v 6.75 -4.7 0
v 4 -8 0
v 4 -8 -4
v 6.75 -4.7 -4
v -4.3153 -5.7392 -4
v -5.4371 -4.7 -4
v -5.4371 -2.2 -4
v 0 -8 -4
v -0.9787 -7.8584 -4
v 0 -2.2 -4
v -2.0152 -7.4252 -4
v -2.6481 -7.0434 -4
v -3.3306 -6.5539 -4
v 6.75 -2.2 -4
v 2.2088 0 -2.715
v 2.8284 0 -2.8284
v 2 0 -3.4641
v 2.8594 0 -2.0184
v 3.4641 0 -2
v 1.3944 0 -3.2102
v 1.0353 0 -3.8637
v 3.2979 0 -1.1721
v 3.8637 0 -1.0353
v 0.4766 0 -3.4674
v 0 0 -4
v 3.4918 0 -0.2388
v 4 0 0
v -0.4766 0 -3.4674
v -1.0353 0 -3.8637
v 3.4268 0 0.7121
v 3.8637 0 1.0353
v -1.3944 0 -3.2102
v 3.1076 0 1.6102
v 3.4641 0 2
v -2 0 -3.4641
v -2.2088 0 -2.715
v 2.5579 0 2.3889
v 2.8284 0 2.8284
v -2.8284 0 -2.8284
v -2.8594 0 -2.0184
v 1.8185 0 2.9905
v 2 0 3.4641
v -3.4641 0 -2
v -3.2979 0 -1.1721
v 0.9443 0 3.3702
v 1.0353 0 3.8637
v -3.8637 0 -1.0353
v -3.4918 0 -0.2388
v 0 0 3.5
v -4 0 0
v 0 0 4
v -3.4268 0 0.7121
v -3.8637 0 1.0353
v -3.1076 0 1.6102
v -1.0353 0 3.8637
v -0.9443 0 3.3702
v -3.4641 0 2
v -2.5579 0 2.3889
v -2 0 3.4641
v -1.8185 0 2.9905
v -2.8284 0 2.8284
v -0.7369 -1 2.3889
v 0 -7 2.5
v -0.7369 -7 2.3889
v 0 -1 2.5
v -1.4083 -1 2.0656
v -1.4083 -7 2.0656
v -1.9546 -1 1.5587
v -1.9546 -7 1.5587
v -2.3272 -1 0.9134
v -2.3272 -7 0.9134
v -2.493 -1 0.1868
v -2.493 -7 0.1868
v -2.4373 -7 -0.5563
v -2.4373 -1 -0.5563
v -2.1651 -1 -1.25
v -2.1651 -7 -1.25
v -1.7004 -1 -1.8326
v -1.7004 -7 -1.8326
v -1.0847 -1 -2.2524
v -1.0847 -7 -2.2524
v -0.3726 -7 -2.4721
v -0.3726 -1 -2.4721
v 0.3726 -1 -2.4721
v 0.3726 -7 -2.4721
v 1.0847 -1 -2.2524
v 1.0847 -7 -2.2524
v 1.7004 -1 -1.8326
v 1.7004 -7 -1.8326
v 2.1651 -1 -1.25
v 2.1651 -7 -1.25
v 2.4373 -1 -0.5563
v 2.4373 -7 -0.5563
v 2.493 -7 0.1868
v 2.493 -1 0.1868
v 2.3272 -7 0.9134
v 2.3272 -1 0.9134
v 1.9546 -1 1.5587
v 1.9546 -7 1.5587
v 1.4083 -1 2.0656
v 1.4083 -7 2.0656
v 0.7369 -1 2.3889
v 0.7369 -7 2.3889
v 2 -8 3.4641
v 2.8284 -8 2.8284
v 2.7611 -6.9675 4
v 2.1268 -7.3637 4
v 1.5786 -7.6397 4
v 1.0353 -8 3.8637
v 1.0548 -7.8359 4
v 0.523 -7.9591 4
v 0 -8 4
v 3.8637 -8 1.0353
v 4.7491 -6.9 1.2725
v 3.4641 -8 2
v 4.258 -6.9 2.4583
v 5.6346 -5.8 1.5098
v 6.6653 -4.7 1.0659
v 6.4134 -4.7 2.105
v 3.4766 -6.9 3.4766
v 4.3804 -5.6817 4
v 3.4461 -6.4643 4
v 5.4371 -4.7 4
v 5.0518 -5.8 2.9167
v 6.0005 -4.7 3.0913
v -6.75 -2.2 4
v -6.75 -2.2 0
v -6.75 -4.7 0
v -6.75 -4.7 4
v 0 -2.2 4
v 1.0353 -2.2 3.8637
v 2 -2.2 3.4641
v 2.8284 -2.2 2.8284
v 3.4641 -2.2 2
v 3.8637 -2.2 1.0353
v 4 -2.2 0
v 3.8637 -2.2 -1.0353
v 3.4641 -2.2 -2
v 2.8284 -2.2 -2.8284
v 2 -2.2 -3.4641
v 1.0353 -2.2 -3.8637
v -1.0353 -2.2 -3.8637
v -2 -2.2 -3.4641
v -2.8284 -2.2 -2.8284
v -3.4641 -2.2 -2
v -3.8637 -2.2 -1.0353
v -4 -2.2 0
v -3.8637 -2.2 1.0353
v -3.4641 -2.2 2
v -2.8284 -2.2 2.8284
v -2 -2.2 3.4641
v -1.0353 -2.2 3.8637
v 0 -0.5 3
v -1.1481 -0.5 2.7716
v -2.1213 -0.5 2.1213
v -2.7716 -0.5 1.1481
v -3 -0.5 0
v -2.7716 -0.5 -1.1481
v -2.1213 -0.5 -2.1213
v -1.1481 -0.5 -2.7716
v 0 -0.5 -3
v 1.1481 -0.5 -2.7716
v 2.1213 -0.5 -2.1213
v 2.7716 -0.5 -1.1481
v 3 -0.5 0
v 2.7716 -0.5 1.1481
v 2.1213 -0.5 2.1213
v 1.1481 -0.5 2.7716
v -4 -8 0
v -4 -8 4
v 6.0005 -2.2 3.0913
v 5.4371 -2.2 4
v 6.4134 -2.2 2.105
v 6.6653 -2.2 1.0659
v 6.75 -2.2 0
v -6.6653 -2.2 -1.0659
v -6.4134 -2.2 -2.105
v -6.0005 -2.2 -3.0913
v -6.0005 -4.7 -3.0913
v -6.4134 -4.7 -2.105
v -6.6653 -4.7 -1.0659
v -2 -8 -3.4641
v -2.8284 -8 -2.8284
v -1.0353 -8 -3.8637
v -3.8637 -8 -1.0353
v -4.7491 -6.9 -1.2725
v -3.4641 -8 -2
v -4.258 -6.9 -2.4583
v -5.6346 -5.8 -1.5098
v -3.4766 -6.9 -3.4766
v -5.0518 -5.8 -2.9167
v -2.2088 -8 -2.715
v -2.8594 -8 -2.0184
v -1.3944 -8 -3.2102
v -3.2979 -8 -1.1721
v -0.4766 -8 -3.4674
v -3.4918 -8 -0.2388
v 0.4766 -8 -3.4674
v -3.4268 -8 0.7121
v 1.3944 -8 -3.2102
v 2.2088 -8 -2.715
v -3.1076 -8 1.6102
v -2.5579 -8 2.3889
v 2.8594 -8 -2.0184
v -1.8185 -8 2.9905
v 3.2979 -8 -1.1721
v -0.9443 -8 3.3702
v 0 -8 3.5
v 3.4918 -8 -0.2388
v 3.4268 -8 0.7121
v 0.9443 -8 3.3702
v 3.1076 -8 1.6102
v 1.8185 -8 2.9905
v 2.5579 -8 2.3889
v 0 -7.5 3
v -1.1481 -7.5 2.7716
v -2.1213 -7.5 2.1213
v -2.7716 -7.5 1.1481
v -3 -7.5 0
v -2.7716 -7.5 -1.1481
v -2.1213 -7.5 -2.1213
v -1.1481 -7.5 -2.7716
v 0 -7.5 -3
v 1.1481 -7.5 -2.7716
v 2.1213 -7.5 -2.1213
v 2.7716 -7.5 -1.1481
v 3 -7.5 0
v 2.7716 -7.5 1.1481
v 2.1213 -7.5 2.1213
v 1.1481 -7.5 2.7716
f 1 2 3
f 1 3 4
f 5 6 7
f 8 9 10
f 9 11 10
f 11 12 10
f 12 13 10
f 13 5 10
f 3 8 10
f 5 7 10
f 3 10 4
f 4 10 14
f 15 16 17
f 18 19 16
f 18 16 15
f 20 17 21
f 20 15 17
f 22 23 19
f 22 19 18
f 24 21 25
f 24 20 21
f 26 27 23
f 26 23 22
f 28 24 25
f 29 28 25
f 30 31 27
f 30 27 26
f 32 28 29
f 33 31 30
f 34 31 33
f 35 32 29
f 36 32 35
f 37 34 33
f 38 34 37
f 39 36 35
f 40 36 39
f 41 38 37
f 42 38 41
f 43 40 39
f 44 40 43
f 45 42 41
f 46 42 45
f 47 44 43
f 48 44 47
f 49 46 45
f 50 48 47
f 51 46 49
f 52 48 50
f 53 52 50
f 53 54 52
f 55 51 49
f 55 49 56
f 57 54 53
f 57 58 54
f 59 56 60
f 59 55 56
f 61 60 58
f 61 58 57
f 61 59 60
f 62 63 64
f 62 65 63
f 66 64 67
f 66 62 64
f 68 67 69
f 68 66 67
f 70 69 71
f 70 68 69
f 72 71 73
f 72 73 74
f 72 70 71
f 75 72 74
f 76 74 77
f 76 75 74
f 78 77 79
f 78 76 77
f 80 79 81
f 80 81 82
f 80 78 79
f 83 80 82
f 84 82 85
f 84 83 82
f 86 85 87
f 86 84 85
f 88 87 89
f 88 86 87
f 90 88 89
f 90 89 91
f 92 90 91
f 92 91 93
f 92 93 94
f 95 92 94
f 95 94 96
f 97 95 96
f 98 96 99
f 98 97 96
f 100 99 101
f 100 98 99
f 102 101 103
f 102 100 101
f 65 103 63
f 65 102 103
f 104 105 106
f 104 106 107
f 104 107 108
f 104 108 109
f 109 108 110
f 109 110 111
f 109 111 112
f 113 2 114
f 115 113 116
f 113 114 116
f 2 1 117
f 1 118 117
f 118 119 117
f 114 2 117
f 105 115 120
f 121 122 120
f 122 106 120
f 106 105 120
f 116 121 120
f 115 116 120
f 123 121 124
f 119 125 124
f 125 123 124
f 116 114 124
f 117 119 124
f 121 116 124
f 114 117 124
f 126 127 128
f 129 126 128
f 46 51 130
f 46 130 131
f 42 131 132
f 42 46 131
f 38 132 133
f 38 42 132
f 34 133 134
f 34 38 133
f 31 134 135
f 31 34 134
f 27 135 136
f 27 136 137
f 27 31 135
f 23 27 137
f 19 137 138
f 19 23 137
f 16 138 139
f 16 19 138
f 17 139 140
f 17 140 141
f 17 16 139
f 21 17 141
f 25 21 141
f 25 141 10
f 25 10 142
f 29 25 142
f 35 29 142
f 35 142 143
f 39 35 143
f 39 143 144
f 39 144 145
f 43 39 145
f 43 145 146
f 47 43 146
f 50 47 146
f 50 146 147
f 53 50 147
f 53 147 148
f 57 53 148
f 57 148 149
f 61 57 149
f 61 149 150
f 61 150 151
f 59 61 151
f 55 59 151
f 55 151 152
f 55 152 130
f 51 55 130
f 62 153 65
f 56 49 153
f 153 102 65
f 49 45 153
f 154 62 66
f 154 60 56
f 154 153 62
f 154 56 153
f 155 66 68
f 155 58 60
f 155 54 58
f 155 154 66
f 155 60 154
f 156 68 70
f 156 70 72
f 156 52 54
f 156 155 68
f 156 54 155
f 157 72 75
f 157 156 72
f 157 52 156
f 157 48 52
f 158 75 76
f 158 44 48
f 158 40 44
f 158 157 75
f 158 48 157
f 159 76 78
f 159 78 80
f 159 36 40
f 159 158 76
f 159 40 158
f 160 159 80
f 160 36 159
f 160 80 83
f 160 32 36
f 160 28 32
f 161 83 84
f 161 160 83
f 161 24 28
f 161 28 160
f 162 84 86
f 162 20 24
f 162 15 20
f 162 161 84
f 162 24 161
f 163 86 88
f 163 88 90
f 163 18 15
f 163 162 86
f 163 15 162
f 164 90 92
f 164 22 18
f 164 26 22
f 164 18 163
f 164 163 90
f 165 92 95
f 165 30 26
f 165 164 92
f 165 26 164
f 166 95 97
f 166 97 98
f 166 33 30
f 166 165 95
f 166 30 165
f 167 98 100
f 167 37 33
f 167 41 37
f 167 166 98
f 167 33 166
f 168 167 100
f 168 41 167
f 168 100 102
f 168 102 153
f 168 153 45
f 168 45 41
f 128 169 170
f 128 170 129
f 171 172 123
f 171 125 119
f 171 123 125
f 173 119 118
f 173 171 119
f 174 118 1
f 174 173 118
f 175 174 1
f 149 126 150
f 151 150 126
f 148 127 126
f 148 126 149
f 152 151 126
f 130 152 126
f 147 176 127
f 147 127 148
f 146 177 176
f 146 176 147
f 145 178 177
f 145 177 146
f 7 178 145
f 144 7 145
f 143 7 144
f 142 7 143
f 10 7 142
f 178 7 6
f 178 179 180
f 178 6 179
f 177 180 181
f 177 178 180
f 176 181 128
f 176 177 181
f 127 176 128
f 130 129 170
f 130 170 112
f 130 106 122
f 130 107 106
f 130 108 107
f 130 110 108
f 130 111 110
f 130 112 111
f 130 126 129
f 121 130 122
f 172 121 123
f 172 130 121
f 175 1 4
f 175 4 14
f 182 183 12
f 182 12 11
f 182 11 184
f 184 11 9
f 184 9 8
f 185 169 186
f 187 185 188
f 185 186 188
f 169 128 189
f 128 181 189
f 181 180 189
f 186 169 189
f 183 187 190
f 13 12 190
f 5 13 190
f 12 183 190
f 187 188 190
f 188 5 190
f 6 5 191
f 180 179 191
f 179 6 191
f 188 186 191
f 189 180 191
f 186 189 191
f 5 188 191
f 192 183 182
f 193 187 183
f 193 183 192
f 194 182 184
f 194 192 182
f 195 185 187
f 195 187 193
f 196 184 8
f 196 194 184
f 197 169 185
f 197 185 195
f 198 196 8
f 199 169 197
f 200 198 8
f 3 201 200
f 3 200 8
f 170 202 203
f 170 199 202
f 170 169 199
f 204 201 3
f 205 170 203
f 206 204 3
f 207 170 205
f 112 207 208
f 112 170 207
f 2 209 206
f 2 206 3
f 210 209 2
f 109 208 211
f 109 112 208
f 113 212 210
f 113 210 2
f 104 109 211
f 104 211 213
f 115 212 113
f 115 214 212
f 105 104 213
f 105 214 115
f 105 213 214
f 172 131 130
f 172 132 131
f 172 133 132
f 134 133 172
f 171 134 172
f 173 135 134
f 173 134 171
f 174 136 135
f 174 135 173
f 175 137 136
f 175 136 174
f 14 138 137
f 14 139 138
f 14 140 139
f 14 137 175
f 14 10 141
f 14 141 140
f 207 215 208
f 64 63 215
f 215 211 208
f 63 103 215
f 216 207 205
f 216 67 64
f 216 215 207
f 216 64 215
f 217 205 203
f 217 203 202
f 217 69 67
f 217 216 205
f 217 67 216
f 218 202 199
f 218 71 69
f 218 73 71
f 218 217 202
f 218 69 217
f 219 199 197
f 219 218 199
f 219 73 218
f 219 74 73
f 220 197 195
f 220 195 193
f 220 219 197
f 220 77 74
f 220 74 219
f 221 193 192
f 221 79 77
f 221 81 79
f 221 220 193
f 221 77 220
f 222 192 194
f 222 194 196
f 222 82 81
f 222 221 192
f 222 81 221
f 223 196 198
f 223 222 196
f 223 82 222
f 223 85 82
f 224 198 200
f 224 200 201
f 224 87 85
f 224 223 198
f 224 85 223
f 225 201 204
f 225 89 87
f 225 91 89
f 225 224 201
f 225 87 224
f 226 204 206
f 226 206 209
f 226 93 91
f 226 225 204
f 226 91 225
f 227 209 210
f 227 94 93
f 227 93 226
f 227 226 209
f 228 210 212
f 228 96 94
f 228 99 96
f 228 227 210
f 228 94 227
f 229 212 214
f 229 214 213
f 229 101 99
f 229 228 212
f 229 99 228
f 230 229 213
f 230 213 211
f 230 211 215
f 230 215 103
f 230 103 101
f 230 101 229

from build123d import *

# Parameters (mm, degrees)
EXTRUDE_1_DEPTH     = 4
SKETCH_4_OUTSIDE_W  = 19.022
SKETCH_4_OUTSIDE_H  = 13.522
SKETCH_4_OUTSIDE_R  = 4
CUT_EXTRUDE_1_DEPTH = 2.2
CUT_EXTRUDE_2_DEPTH = 6.8


with BuildPart() as part:
    # Эскиз1 → Бобышка-Вытянуть1 (new body, symmetric)
    with BuildSketch(Plane.XY):
        Polygon((4, 0), (-4, 0), (-4, -2.2), (-6.75, -2.2), (-6.75, -8), (6.75, -8), (6.75, -2.2), (4, -2.2), align=None)
    extrude(amount=EXTRUDE_1_DEPTH, both=True)

    # Эскиз3 → Отверстие обработанное метчиком M62 (revolve, cut)
    with BuildSketch(Plane(origin=(0, 0, 0), x_dir=(0, 0, 1), z_dir=(1, 0, 0))):
        Polygon((0, 0), (0, 8), (3.5, 8), (2.5, 7), (2.5, 1), (3.5, 0), align=None)
    revolve(axis=Axis((0, 6.35, 0), (0, -1, 0)), mode=Mode.SUBTRACT)

    # Эскиз4 outside → Вырез-Вытянуть1 (cut)
    with BuildSketch(Plane(origin=(0, 0, 0), x_dir=(1, 0, 0), z_dir=(0, 1, 0))):
        Rectangle(SKETCH_4_OUTSIDE_W, SKETCH_4_OUTSIDE_H)
        with Locations(Location((0, 0, 0), (0, 0, 270))):  # turned: the seam where the file's is
            Circle(SKETCH_4_OUTSIDE_R, mode=Mode.SUBTRACT)
    extrude(amount=-CUT_EXTRUDE_1_DEPTH, mode=Mode.SUBTRACT)

    # Эскиз5 → Вырез-Вытянуть2 (cut, through all)
    with BuildSketch(Plane(origin=(0, -2.2, 0), x_dir=(1, 0, 0), z_dir=(0, 1, 0))):
        with BuildLine():
            Line((-6.75, 0), (-6.75, 4))
            Line((-6.75, 4), (-5.437140793, 4))
            ThreePointArc((-5.437140793, 4), (-6.413392252, 2.104970267), (-6.75, 0))
        make_face()
        with BuildLine():
            Line((6.75, 0), (6.75, -4))
            Line((6.75, -4), (5.437140793, -4))
            ThreePointArc((5.437140793, -4), (6.413392252, -2.104970267), (6.75, 0))
        make_face()
    extrude(amount=-CUT_EXTRUDE_2_DEPTH, mode=Mode.SUBTRACT)

    # Вырез-По траектории1: sweep along a path in Эскиз7
    with BuildLine(Plane.XZ.offset(8)) as sweep_1_path:
        Line((0, 6.75), (-6.75, 6.75))
        Line((-6.75, 6.75), (-6.75, 0))
        ThreePointArc((-6.75, 0), (-4.772970773, -4.772970773), (0, -6.75))
        Line((0, -6.75), (6.75, -6.75))
        Line((6.75, -6.75), (6.75, 0))
        ThreePointArc((6.75, 0), (4.772970773, 4.772970773), (0, 6.75))
    # Эскиз6 → Вырез-По траектории1 (sweep, cut)
    with BuildSketch(Plane.XY.offset(4)):
        Polygon((-6.75, -4.7), (-6.75, -8), (-4, -8), align=None)
    sweep(path=sweep_1_path.line, transition=Transition.RIGHT, mode=Mode.SUBTRACT)


solid = part.part
